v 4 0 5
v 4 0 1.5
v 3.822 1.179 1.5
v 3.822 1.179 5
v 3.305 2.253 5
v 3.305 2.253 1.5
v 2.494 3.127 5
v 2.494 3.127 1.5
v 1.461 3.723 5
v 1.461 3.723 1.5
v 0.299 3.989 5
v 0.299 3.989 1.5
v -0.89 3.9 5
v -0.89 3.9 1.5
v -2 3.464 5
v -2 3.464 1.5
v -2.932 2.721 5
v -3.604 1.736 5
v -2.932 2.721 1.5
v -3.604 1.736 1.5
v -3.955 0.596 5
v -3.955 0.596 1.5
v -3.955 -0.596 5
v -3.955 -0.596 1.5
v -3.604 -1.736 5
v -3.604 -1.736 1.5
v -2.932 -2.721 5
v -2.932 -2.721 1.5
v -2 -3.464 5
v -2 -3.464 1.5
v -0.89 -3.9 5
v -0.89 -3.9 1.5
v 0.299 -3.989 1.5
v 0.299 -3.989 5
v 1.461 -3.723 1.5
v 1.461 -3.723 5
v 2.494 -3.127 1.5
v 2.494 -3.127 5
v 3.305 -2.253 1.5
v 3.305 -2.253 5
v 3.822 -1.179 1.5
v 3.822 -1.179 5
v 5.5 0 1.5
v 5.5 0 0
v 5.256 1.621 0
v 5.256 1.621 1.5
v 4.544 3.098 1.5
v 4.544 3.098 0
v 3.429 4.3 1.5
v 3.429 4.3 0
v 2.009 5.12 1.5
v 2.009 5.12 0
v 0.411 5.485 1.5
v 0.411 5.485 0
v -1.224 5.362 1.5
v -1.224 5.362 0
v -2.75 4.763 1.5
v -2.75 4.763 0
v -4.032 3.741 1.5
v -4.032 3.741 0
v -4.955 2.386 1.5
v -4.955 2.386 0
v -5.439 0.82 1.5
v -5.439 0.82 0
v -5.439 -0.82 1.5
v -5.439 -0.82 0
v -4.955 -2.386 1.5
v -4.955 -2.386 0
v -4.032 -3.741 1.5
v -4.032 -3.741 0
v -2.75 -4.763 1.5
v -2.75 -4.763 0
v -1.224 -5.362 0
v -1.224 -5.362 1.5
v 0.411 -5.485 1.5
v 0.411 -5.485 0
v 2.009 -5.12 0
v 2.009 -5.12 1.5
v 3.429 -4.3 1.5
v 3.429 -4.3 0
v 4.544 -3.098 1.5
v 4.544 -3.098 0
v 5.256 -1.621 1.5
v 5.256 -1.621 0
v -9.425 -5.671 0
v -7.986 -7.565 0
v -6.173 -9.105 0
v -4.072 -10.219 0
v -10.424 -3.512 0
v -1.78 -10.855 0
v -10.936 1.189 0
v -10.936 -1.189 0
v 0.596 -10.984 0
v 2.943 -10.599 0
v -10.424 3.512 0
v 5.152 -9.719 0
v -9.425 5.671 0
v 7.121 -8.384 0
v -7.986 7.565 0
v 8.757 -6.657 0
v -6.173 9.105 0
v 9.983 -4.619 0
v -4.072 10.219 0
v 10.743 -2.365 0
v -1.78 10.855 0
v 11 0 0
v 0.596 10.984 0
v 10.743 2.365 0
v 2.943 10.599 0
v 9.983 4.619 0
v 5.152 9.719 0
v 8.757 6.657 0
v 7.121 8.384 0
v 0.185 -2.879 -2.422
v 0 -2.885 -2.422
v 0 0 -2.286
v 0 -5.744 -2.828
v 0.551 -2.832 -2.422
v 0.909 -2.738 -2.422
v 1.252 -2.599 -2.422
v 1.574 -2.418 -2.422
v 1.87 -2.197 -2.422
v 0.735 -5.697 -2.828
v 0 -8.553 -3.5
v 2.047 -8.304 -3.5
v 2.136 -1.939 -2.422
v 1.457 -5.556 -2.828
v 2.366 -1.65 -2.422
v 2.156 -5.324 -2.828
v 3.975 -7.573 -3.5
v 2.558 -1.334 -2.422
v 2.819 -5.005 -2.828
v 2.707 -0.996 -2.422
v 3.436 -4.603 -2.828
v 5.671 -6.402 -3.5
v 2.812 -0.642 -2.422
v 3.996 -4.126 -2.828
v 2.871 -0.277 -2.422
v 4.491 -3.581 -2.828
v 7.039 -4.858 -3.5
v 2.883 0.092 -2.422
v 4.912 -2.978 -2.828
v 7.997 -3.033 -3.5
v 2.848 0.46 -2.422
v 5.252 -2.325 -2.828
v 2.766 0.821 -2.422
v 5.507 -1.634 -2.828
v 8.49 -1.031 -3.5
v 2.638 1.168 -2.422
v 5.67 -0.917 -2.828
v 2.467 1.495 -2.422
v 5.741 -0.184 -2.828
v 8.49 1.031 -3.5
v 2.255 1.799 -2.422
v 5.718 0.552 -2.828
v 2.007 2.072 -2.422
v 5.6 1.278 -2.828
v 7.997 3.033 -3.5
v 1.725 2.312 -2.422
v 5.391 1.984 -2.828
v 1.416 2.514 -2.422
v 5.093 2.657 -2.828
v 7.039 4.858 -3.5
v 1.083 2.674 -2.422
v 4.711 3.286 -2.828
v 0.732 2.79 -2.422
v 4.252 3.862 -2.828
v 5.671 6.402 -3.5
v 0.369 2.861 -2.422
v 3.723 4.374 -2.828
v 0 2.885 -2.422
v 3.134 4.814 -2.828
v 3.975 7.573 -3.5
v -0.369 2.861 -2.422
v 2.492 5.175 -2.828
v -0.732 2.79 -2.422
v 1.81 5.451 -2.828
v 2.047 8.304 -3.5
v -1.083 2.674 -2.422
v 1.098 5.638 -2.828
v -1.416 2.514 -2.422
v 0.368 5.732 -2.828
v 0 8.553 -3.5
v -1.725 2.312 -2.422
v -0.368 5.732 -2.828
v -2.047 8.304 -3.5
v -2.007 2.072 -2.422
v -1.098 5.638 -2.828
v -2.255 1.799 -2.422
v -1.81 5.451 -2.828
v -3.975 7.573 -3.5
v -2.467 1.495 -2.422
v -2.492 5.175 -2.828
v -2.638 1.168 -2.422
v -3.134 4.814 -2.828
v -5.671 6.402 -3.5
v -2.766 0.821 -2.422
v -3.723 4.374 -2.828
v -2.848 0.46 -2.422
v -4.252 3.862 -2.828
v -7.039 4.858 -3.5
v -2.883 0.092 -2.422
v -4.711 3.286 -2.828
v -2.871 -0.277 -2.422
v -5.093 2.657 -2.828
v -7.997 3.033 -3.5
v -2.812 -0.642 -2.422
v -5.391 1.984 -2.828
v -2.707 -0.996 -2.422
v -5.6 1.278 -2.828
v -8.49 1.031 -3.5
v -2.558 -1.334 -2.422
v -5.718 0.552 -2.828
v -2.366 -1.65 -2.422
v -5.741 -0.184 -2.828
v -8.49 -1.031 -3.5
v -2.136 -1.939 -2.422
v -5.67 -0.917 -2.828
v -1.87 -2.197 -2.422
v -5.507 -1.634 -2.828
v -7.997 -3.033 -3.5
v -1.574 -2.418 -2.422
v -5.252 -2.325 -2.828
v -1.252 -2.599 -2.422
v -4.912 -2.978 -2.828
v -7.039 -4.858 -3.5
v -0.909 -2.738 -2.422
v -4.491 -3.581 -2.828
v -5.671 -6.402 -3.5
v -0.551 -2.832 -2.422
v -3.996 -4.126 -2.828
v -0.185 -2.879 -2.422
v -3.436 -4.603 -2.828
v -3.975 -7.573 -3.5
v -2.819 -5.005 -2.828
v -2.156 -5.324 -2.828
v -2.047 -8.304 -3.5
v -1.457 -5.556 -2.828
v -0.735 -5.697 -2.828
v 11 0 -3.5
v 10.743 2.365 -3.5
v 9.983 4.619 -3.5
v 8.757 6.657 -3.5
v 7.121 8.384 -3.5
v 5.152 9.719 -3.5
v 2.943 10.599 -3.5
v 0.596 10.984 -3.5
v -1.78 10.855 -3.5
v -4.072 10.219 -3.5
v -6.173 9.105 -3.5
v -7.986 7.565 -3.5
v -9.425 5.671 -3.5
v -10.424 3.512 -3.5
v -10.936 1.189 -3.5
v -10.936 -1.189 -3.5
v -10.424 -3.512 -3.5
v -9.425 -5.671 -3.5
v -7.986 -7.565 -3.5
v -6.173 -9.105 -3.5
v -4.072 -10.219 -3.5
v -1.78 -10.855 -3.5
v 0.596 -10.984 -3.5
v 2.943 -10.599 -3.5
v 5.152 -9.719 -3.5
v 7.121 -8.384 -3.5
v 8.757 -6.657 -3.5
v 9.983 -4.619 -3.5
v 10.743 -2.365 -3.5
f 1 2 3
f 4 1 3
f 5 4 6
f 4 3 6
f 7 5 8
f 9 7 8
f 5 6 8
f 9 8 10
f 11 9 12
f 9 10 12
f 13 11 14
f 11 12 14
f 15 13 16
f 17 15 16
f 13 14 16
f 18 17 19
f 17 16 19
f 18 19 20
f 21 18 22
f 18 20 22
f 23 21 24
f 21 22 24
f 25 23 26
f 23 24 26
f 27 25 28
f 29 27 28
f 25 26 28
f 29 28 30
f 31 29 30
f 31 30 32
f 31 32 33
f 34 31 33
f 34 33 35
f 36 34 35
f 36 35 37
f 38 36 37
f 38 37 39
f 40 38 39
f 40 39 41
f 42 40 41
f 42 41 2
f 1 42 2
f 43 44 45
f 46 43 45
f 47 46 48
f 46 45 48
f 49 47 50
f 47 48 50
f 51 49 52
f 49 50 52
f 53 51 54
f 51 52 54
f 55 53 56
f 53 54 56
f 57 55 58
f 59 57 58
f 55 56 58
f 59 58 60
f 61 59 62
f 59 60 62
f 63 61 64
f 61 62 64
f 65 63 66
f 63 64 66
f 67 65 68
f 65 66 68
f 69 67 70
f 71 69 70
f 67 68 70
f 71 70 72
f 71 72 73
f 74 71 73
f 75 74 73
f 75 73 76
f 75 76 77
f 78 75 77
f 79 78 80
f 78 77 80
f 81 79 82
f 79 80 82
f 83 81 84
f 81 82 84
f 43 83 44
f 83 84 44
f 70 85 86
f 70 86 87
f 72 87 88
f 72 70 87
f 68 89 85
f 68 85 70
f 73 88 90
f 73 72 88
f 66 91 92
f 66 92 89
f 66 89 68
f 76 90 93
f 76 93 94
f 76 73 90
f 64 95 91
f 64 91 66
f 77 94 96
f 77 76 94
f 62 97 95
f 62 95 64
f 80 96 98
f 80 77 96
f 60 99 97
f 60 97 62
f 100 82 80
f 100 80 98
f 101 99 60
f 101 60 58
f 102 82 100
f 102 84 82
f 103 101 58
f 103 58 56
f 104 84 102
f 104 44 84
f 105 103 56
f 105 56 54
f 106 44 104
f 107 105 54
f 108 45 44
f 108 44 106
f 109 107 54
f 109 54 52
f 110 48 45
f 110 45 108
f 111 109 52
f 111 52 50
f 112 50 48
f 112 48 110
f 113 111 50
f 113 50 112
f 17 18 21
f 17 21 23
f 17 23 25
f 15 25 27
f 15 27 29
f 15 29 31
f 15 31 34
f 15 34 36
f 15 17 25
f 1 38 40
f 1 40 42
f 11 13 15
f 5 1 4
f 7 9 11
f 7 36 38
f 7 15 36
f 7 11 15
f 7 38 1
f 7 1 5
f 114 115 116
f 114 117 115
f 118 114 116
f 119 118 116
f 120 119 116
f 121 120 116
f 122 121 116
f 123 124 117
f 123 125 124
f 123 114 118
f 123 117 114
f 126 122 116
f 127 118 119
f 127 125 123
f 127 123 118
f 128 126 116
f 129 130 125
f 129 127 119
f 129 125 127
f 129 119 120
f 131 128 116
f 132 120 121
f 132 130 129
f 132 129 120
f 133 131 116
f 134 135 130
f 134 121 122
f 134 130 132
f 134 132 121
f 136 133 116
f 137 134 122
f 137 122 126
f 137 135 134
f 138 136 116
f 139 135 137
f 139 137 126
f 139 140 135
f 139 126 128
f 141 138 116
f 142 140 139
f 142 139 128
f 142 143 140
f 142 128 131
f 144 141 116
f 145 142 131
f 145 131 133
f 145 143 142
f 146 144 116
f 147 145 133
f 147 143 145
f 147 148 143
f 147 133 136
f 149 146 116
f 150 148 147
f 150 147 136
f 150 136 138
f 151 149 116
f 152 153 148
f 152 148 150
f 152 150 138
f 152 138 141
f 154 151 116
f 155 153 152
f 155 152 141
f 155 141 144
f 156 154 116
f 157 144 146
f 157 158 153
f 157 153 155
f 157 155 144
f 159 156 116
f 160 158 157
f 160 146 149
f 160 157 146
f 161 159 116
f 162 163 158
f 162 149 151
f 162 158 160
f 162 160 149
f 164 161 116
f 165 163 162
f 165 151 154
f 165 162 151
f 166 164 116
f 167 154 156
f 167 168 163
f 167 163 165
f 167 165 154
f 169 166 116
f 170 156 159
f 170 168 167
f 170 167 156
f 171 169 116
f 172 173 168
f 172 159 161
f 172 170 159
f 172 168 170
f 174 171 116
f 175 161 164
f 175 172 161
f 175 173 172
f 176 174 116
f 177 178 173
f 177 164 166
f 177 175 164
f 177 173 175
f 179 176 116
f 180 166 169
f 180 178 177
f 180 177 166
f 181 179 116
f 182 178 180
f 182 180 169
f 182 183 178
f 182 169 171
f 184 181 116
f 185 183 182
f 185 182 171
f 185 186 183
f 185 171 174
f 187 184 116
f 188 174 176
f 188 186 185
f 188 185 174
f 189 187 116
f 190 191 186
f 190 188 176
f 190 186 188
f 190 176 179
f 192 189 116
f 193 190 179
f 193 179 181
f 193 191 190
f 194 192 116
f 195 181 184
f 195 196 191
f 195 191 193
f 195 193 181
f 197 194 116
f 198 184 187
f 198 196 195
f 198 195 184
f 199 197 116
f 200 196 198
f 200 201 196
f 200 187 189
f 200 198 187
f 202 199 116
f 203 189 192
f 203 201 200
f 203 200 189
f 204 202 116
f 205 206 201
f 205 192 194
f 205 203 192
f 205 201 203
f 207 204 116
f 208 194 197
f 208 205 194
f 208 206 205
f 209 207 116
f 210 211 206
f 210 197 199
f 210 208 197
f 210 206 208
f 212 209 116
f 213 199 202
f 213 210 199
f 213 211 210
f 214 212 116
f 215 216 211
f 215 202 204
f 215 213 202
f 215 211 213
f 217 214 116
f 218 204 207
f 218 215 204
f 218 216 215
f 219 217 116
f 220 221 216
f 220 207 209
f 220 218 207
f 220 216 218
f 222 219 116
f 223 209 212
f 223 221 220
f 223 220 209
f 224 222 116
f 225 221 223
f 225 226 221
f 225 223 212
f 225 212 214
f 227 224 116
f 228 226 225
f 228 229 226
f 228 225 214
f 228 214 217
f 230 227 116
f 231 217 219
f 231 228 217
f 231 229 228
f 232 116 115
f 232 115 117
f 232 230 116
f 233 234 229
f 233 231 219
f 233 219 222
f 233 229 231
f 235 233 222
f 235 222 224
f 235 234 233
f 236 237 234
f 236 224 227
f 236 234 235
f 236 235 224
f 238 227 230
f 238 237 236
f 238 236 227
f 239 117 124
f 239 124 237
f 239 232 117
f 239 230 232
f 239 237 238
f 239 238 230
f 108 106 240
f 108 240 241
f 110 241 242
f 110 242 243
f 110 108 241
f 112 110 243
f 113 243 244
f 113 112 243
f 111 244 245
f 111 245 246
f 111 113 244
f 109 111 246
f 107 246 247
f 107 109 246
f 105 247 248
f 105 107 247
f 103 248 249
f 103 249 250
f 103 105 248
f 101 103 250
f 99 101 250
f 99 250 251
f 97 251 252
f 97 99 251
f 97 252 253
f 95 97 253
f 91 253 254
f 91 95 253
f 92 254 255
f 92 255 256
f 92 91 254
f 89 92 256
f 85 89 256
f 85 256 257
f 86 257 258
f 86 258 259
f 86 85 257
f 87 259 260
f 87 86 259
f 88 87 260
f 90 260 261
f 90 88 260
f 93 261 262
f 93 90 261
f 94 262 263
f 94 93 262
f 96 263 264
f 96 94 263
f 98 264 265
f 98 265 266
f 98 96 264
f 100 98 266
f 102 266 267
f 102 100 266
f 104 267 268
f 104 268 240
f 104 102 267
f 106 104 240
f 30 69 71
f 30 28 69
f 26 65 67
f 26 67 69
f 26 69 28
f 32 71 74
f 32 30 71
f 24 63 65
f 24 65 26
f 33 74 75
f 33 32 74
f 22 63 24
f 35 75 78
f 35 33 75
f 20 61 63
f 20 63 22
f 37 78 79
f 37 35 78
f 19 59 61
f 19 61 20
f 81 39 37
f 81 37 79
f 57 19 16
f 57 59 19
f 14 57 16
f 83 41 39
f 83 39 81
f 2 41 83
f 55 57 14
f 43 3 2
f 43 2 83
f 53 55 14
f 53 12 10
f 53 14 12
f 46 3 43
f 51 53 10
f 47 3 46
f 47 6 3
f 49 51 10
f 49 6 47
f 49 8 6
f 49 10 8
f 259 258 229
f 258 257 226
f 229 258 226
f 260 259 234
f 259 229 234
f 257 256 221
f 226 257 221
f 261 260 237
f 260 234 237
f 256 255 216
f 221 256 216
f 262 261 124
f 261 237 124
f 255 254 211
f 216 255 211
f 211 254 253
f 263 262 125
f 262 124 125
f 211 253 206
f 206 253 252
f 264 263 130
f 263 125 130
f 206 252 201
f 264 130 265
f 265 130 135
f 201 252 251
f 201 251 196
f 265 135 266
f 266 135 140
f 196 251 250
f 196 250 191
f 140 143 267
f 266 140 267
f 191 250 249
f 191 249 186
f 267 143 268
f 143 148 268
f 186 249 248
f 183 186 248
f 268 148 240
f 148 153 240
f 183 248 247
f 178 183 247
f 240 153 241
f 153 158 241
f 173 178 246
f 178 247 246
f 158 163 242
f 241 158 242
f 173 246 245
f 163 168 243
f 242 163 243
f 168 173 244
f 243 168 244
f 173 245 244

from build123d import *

# Parameters (mm, degrees)
F0_R     = 4
F1_DEPTH = 5
F0_R_2   = 11
F0_R_3   = 5.5
F2_DEPTH = 3.5
F5_DEPTH = 1.5


with BuildPart() as f1:
    # F0 (on Top) → F1 (new body)
    with BuildSketch(Plane.XY):
        Circle(F0_R)
    extrude(amount=F1_DEPTH)

    # F0 (on Top) → F2 (join)
    with BuildSketch(Plane.XY):
        Circle(F0_R_2)
        Circle(F0_R_3, mode=Mode.SUBTRACT)
        Circle(F0_R_3)
        Circle(F0_R, mode=Mode.SUBTRACT)
        Circle(F0_R)
    extrude(amount=-F2_DEPTH)

    # F3 (on Right) → F4 (revolve, cut)
    with BuildSketch(Plane.YZ):
        with BuildLine():
            Line((0, -33.02), (0, -2.286))
            ThreePointArc((0, -2.286), (-30.734, -33.02), (0, -63.754))
            Line((0, -63.754), (0, -33.02))
        make_face()
    revolve(axis=Axis((0, 0, -16.51), (0, 0, 1)), mode=Mode.SUBTRACT)

    # F0 (on Top) → F5 (join)
    with BuildSketch(Plane.XY):
        Circle(F0_R_3)
        Circle(F0_R, mode=Mode.SUBTRACT)
    extrude(amount=F5_DEPTH)


solid = f1.part
